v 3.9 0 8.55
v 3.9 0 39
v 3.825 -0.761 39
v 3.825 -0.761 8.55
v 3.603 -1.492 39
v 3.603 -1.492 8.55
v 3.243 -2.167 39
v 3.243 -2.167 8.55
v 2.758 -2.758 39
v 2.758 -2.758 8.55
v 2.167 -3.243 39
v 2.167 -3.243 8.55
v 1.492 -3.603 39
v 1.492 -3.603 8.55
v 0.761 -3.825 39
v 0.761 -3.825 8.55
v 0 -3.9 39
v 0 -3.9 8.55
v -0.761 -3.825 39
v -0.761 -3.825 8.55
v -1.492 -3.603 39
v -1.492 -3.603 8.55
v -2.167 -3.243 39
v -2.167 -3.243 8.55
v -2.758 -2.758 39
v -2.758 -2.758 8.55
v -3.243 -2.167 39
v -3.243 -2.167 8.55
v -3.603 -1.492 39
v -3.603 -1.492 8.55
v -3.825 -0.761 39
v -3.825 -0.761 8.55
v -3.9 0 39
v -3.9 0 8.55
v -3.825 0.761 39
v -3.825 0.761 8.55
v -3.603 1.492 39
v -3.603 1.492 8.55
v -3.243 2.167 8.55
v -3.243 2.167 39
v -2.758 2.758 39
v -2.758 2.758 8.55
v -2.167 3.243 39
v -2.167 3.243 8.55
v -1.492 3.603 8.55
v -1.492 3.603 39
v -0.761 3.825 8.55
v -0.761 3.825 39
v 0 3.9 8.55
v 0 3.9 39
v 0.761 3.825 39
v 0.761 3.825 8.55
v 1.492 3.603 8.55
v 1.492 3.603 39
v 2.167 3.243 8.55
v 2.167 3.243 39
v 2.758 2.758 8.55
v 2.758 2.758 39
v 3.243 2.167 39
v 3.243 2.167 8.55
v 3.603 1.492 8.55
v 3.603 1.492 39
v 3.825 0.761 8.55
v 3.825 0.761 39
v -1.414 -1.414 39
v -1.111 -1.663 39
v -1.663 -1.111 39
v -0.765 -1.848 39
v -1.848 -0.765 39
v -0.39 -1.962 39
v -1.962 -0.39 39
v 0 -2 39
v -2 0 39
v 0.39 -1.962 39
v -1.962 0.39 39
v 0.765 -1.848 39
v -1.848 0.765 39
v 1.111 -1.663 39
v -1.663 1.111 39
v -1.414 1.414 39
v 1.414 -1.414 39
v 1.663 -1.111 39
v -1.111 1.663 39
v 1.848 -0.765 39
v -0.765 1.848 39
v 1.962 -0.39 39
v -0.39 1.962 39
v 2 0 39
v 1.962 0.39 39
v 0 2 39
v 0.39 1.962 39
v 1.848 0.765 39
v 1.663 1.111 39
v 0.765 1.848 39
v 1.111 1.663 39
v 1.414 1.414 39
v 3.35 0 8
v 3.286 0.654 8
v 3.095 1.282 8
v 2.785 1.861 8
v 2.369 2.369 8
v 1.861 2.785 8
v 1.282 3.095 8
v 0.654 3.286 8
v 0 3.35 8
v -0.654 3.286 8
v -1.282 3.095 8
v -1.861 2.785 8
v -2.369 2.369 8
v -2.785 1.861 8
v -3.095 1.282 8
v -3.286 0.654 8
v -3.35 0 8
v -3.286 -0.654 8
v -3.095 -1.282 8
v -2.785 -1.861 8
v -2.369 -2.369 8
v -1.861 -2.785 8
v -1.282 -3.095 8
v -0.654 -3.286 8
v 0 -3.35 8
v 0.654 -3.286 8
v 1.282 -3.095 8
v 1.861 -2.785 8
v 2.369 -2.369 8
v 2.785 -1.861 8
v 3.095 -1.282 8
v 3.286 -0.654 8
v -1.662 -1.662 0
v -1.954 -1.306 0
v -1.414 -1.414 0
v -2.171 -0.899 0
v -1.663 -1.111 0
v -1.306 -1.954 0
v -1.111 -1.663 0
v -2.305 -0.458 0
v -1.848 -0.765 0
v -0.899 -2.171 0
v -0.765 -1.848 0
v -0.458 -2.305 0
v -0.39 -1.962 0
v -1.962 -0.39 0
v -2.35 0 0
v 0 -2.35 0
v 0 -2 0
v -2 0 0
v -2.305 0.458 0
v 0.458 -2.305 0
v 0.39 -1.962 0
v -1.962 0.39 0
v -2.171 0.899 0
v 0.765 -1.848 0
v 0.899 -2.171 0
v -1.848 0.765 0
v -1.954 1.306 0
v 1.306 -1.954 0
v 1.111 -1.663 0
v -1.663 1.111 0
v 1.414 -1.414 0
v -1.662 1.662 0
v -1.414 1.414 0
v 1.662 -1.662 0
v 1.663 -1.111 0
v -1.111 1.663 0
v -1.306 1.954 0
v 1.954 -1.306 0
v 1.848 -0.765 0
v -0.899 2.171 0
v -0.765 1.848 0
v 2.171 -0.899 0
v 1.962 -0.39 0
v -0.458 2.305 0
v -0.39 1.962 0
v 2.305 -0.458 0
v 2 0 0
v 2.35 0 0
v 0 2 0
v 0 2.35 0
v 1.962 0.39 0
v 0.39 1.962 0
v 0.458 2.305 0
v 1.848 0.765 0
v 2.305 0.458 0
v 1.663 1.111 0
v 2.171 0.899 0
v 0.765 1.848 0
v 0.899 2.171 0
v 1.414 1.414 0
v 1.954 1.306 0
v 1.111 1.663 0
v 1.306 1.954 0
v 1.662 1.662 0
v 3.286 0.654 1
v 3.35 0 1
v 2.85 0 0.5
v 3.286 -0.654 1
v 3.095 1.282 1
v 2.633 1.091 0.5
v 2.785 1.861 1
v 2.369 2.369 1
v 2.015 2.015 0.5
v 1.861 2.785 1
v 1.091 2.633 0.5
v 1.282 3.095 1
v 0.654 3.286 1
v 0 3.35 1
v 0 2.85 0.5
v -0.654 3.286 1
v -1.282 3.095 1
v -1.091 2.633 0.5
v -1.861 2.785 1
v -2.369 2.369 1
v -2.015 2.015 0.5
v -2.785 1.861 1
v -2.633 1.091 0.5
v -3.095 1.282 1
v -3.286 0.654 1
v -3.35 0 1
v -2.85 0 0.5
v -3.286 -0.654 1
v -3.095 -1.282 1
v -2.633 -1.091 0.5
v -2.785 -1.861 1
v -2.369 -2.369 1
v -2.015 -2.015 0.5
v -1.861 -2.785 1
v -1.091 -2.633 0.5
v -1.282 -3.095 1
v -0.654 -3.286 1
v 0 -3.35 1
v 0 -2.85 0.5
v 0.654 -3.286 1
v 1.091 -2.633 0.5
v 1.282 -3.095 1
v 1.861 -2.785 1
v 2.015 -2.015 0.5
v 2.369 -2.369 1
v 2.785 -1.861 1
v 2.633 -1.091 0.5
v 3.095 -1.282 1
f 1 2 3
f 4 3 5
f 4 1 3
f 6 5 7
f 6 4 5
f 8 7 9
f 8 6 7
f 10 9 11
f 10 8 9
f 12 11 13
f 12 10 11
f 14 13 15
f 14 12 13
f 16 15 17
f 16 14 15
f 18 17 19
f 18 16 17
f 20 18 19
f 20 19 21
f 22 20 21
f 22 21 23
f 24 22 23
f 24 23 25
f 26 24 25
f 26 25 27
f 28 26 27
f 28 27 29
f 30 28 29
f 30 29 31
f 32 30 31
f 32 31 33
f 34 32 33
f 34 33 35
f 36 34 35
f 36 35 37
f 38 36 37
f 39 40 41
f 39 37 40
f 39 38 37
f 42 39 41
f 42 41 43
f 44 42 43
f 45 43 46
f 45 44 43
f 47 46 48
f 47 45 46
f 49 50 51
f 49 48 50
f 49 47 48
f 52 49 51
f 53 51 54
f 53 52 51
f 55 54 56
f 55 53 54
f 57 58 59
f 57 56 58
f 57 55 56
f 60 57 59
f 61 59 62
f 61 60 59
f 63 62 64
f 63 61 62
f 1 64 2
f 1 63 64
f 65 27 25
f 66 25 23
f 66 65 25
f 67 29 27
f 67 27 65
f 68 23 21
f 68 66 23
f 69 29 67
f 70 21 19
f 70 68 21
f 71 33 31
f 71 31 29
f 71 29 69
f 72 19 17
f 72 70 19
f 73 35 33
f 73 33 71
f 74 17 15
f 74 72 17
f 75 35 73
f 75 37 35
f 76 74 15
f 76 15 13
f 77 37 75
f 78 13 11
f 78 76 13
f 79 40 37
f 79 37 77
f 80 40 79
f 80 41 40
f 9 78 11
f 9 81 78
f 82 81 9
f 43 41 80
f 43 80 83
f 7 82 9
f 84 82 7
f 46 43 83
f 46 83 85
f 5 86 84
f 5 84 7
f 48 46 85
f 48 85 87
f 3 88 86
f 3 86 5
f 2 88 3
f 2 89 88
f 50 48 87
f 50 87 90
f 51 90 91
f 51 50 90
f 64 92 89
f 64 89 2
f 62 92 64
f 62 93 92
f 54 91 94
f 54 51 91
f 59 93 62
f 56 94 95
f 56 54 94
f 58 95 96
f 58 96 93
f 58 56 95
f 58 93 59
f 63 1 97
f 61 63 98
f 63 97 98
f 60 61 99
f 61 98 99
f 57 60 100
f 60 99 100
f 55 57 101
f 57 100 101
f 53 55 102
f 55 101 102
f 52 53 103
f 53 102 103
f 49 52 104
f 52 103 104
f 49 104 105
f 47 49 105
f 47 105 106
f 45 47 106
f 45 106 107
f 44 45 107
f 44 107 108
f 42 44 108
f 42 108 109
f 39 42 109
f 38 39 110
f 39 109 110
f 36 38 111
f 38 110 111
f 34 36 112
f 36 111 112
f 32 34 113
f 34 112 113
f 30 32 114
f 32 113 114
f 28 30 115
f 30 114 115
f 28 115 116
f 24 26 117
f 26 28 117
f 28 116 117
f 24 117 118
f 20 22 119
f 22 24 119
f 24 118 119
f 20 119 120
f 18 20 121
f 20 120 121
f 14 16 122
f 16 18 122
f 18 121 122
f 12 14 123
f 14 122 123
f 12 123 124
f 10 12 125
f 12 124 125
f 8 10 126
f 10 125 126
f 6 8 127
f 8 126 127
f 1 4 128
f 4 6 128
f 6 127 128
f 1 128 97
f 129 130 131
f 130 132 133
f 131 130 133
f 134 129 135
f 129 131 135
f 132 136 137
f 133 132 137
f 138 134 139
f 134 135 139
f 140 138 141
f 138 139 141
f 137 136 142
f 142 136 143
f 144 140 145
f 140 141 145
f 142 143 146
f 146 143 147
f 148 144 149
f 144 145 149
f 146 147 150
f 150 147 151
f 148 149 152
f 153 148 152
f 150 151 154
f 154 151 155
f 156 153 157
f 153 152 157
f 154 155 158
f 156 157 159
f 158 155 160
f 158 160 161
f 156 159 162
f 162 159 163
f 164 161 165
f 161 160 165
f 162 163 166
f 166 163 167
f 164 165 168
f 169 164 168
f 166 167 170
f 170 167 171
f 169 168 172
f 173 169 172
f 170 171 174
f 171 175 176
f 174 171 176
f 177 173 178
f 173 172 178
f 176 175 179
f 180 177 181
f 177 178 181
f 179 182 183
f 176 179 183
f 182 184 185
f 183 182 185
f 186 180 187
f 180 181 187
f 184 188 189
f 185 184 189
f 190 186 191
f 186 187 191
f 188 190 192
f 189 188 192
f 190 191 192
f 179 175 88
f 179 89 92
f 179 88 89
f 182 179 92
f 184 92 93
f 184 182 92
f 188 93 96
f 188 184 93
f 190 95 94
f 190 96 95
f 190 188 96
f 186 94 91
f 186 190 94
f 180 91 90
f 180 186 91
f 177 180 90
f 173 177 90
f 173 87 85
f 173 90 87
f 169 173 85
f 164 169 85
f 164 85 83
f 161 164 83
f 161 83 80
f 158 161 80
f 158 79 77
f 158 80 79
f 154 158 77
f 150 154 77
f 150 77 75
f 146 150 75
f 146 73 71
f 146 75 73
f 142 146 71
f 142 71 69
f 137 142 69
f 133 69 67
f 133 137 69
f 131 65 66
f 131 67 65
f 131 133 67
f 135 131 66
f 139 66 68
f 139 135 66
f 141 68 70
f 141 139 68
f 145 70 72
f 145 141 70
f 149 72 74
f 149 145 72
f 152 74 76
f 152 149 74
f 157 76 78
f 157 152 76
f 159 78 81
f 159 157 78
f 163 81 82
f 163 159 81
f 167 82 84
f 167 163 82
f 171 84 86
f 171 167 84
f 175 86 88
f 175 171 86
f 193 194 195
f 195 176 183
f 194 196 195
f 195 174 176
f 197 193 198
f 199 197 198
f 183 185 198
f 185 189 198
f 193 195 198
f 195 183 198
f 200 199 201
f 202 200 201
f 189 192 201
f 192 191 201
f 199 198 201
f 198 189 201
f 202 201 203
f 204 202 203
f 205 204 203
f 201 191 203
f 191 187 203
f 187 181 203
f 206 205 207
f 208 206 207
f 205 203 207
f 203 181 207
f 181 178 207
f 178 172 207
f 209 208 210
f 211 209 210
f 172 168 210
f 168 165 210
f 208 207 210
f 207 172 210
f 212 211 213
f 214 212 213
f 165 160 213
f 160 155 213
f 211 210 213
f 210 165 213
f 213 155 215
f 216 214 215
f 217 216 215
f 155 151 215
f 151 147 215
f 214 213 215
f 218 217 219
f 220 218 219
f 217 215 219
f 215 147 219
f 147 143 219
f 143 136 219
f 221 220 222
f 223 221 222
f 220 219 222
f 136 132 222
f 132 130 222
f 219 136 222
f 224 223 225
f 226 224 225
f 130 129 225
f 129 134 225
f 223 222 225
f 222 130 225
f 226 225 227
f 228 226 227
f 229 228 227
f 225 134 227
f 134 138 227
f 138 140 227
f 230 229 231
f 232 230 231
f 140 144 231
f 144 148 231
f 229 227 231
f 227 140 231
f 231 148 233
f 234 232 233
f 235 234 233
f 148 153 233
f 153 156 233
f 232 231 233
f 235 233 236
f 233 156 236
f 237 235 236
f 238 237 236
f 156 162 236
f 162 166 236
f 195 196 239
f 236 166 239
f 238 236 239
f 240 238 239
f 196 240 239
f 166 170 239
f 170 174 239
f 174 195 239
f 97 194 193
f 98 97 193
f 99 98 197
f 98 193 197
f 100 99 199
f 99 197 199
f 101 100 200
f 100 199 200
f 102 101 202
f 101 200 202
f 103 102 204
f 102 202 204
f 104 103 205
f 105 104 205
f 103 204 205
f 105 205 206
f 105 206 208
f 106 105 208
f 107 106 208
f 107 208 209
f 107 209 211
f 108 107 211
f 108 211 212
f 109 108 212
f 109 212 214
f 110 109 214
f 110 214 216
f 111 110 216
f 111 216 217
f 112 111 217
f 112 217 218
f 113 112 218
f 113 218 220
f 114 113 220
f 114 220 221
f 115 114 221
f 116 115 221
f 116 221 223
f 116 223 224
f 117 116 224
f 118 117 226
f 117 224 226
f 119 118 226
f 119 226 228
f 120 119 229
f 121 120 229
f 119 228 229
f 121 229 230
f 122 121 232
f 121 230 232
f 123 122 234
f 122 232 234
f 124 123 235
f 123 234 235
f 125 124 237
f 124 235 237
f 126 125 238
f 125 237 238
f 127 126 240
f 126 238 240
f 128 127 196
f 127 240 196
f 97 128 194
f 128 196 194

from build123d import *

# Parameters (mm, degrees)
SKETCH1_R               = 3.35
BOSS_EXTRUDE1_DEPTH     = 9
SKETCH2_R               = 3.9
BOSS_EXTRUDE2_DEPTH     = 30
CHAMFER1_SIZE           = 1
CHAMFER2_SIZE           = 1
CUT_EXTRUDE1_DEPTH      = 40.38806926
CUT_EXTRUDE1_DEPTH_BACK = 40.38806926
SKETCH8_R               = 2


with BuildPart() as part:
    # Sketch1 → Boss-Extrude1 (new body)
    with BuildSketch(Plane(origin=(0, 0, 0), x_dir=(0, 1, 0), z_dir=(0, 0, 1))):
        with Locations(Location((0, 0, 0), (0, 0, 270))):
            Circle(SKETCH1_R)
    extrude(amount=BOSS_EXTRUDE1_DEPTH)

    # Sketch2 → Boss-Extrude2 (add)
    with BuildSketch(Plane.XY.offset(9)):
        Circle(SKETCH2_R)
    extrude(amount=BOSS_EXTRUDE2_DEPTH)

    # Chamfer1
    # the kernel refuses this chamfer: 1 mm, written as the material it adds along each edge
    with BuildSketch(Plane(origin=(0, 0, 9), x_dir=(1, 0, 0), z_dir=(0, -1, 0))) as chamfer1_piece_1_section:
        Polygon((3.35 + CHAMFER1_SIZE, 0), (3.35, -CHAMFER1_SIZE), (3.35, 0), align=None)
    chamfer1_piece_1 = revolve(axis=Axis((0, 0, 9), (0, 0, 1)), mode=Mode.PRIVATE)
    chamfer1_piece_1 = chamfer1_piece_1 & Plane(origin=(0, 0, 8.27596247), x_dir=(1, 0, 0), z_dir=(0, 0, -1)) * Cylinder(3.9, 18, mode=Mode.PRIVATE)
    add(chamfer1_piece_1)

    # Chamfer2
    chamfer2_edges = [part.edges().sort_by_distance(p)[0] for p in [
        (-3.35, 0, 0),
    ]]
    chamfer(chamfer2_edges, length=CHAMFER2_SIZE)

    # Sketch8 → Cut-Extrude1 (cut, two sides: drawn at the far end of the back side and taken through both)
    with BuildSketch(Plane.XY.offset(39).offset(-CUT_EXTRUDE1_DEPTH_BACK)):
        Circle(SKETCH8_R)
    extrude(amount=CUT_EXTRUDE1_DEPTH + CUT_EXTRUDE1_DEPTH_BACK, mode=Mode.SUBTRACT)


solid = part.part
